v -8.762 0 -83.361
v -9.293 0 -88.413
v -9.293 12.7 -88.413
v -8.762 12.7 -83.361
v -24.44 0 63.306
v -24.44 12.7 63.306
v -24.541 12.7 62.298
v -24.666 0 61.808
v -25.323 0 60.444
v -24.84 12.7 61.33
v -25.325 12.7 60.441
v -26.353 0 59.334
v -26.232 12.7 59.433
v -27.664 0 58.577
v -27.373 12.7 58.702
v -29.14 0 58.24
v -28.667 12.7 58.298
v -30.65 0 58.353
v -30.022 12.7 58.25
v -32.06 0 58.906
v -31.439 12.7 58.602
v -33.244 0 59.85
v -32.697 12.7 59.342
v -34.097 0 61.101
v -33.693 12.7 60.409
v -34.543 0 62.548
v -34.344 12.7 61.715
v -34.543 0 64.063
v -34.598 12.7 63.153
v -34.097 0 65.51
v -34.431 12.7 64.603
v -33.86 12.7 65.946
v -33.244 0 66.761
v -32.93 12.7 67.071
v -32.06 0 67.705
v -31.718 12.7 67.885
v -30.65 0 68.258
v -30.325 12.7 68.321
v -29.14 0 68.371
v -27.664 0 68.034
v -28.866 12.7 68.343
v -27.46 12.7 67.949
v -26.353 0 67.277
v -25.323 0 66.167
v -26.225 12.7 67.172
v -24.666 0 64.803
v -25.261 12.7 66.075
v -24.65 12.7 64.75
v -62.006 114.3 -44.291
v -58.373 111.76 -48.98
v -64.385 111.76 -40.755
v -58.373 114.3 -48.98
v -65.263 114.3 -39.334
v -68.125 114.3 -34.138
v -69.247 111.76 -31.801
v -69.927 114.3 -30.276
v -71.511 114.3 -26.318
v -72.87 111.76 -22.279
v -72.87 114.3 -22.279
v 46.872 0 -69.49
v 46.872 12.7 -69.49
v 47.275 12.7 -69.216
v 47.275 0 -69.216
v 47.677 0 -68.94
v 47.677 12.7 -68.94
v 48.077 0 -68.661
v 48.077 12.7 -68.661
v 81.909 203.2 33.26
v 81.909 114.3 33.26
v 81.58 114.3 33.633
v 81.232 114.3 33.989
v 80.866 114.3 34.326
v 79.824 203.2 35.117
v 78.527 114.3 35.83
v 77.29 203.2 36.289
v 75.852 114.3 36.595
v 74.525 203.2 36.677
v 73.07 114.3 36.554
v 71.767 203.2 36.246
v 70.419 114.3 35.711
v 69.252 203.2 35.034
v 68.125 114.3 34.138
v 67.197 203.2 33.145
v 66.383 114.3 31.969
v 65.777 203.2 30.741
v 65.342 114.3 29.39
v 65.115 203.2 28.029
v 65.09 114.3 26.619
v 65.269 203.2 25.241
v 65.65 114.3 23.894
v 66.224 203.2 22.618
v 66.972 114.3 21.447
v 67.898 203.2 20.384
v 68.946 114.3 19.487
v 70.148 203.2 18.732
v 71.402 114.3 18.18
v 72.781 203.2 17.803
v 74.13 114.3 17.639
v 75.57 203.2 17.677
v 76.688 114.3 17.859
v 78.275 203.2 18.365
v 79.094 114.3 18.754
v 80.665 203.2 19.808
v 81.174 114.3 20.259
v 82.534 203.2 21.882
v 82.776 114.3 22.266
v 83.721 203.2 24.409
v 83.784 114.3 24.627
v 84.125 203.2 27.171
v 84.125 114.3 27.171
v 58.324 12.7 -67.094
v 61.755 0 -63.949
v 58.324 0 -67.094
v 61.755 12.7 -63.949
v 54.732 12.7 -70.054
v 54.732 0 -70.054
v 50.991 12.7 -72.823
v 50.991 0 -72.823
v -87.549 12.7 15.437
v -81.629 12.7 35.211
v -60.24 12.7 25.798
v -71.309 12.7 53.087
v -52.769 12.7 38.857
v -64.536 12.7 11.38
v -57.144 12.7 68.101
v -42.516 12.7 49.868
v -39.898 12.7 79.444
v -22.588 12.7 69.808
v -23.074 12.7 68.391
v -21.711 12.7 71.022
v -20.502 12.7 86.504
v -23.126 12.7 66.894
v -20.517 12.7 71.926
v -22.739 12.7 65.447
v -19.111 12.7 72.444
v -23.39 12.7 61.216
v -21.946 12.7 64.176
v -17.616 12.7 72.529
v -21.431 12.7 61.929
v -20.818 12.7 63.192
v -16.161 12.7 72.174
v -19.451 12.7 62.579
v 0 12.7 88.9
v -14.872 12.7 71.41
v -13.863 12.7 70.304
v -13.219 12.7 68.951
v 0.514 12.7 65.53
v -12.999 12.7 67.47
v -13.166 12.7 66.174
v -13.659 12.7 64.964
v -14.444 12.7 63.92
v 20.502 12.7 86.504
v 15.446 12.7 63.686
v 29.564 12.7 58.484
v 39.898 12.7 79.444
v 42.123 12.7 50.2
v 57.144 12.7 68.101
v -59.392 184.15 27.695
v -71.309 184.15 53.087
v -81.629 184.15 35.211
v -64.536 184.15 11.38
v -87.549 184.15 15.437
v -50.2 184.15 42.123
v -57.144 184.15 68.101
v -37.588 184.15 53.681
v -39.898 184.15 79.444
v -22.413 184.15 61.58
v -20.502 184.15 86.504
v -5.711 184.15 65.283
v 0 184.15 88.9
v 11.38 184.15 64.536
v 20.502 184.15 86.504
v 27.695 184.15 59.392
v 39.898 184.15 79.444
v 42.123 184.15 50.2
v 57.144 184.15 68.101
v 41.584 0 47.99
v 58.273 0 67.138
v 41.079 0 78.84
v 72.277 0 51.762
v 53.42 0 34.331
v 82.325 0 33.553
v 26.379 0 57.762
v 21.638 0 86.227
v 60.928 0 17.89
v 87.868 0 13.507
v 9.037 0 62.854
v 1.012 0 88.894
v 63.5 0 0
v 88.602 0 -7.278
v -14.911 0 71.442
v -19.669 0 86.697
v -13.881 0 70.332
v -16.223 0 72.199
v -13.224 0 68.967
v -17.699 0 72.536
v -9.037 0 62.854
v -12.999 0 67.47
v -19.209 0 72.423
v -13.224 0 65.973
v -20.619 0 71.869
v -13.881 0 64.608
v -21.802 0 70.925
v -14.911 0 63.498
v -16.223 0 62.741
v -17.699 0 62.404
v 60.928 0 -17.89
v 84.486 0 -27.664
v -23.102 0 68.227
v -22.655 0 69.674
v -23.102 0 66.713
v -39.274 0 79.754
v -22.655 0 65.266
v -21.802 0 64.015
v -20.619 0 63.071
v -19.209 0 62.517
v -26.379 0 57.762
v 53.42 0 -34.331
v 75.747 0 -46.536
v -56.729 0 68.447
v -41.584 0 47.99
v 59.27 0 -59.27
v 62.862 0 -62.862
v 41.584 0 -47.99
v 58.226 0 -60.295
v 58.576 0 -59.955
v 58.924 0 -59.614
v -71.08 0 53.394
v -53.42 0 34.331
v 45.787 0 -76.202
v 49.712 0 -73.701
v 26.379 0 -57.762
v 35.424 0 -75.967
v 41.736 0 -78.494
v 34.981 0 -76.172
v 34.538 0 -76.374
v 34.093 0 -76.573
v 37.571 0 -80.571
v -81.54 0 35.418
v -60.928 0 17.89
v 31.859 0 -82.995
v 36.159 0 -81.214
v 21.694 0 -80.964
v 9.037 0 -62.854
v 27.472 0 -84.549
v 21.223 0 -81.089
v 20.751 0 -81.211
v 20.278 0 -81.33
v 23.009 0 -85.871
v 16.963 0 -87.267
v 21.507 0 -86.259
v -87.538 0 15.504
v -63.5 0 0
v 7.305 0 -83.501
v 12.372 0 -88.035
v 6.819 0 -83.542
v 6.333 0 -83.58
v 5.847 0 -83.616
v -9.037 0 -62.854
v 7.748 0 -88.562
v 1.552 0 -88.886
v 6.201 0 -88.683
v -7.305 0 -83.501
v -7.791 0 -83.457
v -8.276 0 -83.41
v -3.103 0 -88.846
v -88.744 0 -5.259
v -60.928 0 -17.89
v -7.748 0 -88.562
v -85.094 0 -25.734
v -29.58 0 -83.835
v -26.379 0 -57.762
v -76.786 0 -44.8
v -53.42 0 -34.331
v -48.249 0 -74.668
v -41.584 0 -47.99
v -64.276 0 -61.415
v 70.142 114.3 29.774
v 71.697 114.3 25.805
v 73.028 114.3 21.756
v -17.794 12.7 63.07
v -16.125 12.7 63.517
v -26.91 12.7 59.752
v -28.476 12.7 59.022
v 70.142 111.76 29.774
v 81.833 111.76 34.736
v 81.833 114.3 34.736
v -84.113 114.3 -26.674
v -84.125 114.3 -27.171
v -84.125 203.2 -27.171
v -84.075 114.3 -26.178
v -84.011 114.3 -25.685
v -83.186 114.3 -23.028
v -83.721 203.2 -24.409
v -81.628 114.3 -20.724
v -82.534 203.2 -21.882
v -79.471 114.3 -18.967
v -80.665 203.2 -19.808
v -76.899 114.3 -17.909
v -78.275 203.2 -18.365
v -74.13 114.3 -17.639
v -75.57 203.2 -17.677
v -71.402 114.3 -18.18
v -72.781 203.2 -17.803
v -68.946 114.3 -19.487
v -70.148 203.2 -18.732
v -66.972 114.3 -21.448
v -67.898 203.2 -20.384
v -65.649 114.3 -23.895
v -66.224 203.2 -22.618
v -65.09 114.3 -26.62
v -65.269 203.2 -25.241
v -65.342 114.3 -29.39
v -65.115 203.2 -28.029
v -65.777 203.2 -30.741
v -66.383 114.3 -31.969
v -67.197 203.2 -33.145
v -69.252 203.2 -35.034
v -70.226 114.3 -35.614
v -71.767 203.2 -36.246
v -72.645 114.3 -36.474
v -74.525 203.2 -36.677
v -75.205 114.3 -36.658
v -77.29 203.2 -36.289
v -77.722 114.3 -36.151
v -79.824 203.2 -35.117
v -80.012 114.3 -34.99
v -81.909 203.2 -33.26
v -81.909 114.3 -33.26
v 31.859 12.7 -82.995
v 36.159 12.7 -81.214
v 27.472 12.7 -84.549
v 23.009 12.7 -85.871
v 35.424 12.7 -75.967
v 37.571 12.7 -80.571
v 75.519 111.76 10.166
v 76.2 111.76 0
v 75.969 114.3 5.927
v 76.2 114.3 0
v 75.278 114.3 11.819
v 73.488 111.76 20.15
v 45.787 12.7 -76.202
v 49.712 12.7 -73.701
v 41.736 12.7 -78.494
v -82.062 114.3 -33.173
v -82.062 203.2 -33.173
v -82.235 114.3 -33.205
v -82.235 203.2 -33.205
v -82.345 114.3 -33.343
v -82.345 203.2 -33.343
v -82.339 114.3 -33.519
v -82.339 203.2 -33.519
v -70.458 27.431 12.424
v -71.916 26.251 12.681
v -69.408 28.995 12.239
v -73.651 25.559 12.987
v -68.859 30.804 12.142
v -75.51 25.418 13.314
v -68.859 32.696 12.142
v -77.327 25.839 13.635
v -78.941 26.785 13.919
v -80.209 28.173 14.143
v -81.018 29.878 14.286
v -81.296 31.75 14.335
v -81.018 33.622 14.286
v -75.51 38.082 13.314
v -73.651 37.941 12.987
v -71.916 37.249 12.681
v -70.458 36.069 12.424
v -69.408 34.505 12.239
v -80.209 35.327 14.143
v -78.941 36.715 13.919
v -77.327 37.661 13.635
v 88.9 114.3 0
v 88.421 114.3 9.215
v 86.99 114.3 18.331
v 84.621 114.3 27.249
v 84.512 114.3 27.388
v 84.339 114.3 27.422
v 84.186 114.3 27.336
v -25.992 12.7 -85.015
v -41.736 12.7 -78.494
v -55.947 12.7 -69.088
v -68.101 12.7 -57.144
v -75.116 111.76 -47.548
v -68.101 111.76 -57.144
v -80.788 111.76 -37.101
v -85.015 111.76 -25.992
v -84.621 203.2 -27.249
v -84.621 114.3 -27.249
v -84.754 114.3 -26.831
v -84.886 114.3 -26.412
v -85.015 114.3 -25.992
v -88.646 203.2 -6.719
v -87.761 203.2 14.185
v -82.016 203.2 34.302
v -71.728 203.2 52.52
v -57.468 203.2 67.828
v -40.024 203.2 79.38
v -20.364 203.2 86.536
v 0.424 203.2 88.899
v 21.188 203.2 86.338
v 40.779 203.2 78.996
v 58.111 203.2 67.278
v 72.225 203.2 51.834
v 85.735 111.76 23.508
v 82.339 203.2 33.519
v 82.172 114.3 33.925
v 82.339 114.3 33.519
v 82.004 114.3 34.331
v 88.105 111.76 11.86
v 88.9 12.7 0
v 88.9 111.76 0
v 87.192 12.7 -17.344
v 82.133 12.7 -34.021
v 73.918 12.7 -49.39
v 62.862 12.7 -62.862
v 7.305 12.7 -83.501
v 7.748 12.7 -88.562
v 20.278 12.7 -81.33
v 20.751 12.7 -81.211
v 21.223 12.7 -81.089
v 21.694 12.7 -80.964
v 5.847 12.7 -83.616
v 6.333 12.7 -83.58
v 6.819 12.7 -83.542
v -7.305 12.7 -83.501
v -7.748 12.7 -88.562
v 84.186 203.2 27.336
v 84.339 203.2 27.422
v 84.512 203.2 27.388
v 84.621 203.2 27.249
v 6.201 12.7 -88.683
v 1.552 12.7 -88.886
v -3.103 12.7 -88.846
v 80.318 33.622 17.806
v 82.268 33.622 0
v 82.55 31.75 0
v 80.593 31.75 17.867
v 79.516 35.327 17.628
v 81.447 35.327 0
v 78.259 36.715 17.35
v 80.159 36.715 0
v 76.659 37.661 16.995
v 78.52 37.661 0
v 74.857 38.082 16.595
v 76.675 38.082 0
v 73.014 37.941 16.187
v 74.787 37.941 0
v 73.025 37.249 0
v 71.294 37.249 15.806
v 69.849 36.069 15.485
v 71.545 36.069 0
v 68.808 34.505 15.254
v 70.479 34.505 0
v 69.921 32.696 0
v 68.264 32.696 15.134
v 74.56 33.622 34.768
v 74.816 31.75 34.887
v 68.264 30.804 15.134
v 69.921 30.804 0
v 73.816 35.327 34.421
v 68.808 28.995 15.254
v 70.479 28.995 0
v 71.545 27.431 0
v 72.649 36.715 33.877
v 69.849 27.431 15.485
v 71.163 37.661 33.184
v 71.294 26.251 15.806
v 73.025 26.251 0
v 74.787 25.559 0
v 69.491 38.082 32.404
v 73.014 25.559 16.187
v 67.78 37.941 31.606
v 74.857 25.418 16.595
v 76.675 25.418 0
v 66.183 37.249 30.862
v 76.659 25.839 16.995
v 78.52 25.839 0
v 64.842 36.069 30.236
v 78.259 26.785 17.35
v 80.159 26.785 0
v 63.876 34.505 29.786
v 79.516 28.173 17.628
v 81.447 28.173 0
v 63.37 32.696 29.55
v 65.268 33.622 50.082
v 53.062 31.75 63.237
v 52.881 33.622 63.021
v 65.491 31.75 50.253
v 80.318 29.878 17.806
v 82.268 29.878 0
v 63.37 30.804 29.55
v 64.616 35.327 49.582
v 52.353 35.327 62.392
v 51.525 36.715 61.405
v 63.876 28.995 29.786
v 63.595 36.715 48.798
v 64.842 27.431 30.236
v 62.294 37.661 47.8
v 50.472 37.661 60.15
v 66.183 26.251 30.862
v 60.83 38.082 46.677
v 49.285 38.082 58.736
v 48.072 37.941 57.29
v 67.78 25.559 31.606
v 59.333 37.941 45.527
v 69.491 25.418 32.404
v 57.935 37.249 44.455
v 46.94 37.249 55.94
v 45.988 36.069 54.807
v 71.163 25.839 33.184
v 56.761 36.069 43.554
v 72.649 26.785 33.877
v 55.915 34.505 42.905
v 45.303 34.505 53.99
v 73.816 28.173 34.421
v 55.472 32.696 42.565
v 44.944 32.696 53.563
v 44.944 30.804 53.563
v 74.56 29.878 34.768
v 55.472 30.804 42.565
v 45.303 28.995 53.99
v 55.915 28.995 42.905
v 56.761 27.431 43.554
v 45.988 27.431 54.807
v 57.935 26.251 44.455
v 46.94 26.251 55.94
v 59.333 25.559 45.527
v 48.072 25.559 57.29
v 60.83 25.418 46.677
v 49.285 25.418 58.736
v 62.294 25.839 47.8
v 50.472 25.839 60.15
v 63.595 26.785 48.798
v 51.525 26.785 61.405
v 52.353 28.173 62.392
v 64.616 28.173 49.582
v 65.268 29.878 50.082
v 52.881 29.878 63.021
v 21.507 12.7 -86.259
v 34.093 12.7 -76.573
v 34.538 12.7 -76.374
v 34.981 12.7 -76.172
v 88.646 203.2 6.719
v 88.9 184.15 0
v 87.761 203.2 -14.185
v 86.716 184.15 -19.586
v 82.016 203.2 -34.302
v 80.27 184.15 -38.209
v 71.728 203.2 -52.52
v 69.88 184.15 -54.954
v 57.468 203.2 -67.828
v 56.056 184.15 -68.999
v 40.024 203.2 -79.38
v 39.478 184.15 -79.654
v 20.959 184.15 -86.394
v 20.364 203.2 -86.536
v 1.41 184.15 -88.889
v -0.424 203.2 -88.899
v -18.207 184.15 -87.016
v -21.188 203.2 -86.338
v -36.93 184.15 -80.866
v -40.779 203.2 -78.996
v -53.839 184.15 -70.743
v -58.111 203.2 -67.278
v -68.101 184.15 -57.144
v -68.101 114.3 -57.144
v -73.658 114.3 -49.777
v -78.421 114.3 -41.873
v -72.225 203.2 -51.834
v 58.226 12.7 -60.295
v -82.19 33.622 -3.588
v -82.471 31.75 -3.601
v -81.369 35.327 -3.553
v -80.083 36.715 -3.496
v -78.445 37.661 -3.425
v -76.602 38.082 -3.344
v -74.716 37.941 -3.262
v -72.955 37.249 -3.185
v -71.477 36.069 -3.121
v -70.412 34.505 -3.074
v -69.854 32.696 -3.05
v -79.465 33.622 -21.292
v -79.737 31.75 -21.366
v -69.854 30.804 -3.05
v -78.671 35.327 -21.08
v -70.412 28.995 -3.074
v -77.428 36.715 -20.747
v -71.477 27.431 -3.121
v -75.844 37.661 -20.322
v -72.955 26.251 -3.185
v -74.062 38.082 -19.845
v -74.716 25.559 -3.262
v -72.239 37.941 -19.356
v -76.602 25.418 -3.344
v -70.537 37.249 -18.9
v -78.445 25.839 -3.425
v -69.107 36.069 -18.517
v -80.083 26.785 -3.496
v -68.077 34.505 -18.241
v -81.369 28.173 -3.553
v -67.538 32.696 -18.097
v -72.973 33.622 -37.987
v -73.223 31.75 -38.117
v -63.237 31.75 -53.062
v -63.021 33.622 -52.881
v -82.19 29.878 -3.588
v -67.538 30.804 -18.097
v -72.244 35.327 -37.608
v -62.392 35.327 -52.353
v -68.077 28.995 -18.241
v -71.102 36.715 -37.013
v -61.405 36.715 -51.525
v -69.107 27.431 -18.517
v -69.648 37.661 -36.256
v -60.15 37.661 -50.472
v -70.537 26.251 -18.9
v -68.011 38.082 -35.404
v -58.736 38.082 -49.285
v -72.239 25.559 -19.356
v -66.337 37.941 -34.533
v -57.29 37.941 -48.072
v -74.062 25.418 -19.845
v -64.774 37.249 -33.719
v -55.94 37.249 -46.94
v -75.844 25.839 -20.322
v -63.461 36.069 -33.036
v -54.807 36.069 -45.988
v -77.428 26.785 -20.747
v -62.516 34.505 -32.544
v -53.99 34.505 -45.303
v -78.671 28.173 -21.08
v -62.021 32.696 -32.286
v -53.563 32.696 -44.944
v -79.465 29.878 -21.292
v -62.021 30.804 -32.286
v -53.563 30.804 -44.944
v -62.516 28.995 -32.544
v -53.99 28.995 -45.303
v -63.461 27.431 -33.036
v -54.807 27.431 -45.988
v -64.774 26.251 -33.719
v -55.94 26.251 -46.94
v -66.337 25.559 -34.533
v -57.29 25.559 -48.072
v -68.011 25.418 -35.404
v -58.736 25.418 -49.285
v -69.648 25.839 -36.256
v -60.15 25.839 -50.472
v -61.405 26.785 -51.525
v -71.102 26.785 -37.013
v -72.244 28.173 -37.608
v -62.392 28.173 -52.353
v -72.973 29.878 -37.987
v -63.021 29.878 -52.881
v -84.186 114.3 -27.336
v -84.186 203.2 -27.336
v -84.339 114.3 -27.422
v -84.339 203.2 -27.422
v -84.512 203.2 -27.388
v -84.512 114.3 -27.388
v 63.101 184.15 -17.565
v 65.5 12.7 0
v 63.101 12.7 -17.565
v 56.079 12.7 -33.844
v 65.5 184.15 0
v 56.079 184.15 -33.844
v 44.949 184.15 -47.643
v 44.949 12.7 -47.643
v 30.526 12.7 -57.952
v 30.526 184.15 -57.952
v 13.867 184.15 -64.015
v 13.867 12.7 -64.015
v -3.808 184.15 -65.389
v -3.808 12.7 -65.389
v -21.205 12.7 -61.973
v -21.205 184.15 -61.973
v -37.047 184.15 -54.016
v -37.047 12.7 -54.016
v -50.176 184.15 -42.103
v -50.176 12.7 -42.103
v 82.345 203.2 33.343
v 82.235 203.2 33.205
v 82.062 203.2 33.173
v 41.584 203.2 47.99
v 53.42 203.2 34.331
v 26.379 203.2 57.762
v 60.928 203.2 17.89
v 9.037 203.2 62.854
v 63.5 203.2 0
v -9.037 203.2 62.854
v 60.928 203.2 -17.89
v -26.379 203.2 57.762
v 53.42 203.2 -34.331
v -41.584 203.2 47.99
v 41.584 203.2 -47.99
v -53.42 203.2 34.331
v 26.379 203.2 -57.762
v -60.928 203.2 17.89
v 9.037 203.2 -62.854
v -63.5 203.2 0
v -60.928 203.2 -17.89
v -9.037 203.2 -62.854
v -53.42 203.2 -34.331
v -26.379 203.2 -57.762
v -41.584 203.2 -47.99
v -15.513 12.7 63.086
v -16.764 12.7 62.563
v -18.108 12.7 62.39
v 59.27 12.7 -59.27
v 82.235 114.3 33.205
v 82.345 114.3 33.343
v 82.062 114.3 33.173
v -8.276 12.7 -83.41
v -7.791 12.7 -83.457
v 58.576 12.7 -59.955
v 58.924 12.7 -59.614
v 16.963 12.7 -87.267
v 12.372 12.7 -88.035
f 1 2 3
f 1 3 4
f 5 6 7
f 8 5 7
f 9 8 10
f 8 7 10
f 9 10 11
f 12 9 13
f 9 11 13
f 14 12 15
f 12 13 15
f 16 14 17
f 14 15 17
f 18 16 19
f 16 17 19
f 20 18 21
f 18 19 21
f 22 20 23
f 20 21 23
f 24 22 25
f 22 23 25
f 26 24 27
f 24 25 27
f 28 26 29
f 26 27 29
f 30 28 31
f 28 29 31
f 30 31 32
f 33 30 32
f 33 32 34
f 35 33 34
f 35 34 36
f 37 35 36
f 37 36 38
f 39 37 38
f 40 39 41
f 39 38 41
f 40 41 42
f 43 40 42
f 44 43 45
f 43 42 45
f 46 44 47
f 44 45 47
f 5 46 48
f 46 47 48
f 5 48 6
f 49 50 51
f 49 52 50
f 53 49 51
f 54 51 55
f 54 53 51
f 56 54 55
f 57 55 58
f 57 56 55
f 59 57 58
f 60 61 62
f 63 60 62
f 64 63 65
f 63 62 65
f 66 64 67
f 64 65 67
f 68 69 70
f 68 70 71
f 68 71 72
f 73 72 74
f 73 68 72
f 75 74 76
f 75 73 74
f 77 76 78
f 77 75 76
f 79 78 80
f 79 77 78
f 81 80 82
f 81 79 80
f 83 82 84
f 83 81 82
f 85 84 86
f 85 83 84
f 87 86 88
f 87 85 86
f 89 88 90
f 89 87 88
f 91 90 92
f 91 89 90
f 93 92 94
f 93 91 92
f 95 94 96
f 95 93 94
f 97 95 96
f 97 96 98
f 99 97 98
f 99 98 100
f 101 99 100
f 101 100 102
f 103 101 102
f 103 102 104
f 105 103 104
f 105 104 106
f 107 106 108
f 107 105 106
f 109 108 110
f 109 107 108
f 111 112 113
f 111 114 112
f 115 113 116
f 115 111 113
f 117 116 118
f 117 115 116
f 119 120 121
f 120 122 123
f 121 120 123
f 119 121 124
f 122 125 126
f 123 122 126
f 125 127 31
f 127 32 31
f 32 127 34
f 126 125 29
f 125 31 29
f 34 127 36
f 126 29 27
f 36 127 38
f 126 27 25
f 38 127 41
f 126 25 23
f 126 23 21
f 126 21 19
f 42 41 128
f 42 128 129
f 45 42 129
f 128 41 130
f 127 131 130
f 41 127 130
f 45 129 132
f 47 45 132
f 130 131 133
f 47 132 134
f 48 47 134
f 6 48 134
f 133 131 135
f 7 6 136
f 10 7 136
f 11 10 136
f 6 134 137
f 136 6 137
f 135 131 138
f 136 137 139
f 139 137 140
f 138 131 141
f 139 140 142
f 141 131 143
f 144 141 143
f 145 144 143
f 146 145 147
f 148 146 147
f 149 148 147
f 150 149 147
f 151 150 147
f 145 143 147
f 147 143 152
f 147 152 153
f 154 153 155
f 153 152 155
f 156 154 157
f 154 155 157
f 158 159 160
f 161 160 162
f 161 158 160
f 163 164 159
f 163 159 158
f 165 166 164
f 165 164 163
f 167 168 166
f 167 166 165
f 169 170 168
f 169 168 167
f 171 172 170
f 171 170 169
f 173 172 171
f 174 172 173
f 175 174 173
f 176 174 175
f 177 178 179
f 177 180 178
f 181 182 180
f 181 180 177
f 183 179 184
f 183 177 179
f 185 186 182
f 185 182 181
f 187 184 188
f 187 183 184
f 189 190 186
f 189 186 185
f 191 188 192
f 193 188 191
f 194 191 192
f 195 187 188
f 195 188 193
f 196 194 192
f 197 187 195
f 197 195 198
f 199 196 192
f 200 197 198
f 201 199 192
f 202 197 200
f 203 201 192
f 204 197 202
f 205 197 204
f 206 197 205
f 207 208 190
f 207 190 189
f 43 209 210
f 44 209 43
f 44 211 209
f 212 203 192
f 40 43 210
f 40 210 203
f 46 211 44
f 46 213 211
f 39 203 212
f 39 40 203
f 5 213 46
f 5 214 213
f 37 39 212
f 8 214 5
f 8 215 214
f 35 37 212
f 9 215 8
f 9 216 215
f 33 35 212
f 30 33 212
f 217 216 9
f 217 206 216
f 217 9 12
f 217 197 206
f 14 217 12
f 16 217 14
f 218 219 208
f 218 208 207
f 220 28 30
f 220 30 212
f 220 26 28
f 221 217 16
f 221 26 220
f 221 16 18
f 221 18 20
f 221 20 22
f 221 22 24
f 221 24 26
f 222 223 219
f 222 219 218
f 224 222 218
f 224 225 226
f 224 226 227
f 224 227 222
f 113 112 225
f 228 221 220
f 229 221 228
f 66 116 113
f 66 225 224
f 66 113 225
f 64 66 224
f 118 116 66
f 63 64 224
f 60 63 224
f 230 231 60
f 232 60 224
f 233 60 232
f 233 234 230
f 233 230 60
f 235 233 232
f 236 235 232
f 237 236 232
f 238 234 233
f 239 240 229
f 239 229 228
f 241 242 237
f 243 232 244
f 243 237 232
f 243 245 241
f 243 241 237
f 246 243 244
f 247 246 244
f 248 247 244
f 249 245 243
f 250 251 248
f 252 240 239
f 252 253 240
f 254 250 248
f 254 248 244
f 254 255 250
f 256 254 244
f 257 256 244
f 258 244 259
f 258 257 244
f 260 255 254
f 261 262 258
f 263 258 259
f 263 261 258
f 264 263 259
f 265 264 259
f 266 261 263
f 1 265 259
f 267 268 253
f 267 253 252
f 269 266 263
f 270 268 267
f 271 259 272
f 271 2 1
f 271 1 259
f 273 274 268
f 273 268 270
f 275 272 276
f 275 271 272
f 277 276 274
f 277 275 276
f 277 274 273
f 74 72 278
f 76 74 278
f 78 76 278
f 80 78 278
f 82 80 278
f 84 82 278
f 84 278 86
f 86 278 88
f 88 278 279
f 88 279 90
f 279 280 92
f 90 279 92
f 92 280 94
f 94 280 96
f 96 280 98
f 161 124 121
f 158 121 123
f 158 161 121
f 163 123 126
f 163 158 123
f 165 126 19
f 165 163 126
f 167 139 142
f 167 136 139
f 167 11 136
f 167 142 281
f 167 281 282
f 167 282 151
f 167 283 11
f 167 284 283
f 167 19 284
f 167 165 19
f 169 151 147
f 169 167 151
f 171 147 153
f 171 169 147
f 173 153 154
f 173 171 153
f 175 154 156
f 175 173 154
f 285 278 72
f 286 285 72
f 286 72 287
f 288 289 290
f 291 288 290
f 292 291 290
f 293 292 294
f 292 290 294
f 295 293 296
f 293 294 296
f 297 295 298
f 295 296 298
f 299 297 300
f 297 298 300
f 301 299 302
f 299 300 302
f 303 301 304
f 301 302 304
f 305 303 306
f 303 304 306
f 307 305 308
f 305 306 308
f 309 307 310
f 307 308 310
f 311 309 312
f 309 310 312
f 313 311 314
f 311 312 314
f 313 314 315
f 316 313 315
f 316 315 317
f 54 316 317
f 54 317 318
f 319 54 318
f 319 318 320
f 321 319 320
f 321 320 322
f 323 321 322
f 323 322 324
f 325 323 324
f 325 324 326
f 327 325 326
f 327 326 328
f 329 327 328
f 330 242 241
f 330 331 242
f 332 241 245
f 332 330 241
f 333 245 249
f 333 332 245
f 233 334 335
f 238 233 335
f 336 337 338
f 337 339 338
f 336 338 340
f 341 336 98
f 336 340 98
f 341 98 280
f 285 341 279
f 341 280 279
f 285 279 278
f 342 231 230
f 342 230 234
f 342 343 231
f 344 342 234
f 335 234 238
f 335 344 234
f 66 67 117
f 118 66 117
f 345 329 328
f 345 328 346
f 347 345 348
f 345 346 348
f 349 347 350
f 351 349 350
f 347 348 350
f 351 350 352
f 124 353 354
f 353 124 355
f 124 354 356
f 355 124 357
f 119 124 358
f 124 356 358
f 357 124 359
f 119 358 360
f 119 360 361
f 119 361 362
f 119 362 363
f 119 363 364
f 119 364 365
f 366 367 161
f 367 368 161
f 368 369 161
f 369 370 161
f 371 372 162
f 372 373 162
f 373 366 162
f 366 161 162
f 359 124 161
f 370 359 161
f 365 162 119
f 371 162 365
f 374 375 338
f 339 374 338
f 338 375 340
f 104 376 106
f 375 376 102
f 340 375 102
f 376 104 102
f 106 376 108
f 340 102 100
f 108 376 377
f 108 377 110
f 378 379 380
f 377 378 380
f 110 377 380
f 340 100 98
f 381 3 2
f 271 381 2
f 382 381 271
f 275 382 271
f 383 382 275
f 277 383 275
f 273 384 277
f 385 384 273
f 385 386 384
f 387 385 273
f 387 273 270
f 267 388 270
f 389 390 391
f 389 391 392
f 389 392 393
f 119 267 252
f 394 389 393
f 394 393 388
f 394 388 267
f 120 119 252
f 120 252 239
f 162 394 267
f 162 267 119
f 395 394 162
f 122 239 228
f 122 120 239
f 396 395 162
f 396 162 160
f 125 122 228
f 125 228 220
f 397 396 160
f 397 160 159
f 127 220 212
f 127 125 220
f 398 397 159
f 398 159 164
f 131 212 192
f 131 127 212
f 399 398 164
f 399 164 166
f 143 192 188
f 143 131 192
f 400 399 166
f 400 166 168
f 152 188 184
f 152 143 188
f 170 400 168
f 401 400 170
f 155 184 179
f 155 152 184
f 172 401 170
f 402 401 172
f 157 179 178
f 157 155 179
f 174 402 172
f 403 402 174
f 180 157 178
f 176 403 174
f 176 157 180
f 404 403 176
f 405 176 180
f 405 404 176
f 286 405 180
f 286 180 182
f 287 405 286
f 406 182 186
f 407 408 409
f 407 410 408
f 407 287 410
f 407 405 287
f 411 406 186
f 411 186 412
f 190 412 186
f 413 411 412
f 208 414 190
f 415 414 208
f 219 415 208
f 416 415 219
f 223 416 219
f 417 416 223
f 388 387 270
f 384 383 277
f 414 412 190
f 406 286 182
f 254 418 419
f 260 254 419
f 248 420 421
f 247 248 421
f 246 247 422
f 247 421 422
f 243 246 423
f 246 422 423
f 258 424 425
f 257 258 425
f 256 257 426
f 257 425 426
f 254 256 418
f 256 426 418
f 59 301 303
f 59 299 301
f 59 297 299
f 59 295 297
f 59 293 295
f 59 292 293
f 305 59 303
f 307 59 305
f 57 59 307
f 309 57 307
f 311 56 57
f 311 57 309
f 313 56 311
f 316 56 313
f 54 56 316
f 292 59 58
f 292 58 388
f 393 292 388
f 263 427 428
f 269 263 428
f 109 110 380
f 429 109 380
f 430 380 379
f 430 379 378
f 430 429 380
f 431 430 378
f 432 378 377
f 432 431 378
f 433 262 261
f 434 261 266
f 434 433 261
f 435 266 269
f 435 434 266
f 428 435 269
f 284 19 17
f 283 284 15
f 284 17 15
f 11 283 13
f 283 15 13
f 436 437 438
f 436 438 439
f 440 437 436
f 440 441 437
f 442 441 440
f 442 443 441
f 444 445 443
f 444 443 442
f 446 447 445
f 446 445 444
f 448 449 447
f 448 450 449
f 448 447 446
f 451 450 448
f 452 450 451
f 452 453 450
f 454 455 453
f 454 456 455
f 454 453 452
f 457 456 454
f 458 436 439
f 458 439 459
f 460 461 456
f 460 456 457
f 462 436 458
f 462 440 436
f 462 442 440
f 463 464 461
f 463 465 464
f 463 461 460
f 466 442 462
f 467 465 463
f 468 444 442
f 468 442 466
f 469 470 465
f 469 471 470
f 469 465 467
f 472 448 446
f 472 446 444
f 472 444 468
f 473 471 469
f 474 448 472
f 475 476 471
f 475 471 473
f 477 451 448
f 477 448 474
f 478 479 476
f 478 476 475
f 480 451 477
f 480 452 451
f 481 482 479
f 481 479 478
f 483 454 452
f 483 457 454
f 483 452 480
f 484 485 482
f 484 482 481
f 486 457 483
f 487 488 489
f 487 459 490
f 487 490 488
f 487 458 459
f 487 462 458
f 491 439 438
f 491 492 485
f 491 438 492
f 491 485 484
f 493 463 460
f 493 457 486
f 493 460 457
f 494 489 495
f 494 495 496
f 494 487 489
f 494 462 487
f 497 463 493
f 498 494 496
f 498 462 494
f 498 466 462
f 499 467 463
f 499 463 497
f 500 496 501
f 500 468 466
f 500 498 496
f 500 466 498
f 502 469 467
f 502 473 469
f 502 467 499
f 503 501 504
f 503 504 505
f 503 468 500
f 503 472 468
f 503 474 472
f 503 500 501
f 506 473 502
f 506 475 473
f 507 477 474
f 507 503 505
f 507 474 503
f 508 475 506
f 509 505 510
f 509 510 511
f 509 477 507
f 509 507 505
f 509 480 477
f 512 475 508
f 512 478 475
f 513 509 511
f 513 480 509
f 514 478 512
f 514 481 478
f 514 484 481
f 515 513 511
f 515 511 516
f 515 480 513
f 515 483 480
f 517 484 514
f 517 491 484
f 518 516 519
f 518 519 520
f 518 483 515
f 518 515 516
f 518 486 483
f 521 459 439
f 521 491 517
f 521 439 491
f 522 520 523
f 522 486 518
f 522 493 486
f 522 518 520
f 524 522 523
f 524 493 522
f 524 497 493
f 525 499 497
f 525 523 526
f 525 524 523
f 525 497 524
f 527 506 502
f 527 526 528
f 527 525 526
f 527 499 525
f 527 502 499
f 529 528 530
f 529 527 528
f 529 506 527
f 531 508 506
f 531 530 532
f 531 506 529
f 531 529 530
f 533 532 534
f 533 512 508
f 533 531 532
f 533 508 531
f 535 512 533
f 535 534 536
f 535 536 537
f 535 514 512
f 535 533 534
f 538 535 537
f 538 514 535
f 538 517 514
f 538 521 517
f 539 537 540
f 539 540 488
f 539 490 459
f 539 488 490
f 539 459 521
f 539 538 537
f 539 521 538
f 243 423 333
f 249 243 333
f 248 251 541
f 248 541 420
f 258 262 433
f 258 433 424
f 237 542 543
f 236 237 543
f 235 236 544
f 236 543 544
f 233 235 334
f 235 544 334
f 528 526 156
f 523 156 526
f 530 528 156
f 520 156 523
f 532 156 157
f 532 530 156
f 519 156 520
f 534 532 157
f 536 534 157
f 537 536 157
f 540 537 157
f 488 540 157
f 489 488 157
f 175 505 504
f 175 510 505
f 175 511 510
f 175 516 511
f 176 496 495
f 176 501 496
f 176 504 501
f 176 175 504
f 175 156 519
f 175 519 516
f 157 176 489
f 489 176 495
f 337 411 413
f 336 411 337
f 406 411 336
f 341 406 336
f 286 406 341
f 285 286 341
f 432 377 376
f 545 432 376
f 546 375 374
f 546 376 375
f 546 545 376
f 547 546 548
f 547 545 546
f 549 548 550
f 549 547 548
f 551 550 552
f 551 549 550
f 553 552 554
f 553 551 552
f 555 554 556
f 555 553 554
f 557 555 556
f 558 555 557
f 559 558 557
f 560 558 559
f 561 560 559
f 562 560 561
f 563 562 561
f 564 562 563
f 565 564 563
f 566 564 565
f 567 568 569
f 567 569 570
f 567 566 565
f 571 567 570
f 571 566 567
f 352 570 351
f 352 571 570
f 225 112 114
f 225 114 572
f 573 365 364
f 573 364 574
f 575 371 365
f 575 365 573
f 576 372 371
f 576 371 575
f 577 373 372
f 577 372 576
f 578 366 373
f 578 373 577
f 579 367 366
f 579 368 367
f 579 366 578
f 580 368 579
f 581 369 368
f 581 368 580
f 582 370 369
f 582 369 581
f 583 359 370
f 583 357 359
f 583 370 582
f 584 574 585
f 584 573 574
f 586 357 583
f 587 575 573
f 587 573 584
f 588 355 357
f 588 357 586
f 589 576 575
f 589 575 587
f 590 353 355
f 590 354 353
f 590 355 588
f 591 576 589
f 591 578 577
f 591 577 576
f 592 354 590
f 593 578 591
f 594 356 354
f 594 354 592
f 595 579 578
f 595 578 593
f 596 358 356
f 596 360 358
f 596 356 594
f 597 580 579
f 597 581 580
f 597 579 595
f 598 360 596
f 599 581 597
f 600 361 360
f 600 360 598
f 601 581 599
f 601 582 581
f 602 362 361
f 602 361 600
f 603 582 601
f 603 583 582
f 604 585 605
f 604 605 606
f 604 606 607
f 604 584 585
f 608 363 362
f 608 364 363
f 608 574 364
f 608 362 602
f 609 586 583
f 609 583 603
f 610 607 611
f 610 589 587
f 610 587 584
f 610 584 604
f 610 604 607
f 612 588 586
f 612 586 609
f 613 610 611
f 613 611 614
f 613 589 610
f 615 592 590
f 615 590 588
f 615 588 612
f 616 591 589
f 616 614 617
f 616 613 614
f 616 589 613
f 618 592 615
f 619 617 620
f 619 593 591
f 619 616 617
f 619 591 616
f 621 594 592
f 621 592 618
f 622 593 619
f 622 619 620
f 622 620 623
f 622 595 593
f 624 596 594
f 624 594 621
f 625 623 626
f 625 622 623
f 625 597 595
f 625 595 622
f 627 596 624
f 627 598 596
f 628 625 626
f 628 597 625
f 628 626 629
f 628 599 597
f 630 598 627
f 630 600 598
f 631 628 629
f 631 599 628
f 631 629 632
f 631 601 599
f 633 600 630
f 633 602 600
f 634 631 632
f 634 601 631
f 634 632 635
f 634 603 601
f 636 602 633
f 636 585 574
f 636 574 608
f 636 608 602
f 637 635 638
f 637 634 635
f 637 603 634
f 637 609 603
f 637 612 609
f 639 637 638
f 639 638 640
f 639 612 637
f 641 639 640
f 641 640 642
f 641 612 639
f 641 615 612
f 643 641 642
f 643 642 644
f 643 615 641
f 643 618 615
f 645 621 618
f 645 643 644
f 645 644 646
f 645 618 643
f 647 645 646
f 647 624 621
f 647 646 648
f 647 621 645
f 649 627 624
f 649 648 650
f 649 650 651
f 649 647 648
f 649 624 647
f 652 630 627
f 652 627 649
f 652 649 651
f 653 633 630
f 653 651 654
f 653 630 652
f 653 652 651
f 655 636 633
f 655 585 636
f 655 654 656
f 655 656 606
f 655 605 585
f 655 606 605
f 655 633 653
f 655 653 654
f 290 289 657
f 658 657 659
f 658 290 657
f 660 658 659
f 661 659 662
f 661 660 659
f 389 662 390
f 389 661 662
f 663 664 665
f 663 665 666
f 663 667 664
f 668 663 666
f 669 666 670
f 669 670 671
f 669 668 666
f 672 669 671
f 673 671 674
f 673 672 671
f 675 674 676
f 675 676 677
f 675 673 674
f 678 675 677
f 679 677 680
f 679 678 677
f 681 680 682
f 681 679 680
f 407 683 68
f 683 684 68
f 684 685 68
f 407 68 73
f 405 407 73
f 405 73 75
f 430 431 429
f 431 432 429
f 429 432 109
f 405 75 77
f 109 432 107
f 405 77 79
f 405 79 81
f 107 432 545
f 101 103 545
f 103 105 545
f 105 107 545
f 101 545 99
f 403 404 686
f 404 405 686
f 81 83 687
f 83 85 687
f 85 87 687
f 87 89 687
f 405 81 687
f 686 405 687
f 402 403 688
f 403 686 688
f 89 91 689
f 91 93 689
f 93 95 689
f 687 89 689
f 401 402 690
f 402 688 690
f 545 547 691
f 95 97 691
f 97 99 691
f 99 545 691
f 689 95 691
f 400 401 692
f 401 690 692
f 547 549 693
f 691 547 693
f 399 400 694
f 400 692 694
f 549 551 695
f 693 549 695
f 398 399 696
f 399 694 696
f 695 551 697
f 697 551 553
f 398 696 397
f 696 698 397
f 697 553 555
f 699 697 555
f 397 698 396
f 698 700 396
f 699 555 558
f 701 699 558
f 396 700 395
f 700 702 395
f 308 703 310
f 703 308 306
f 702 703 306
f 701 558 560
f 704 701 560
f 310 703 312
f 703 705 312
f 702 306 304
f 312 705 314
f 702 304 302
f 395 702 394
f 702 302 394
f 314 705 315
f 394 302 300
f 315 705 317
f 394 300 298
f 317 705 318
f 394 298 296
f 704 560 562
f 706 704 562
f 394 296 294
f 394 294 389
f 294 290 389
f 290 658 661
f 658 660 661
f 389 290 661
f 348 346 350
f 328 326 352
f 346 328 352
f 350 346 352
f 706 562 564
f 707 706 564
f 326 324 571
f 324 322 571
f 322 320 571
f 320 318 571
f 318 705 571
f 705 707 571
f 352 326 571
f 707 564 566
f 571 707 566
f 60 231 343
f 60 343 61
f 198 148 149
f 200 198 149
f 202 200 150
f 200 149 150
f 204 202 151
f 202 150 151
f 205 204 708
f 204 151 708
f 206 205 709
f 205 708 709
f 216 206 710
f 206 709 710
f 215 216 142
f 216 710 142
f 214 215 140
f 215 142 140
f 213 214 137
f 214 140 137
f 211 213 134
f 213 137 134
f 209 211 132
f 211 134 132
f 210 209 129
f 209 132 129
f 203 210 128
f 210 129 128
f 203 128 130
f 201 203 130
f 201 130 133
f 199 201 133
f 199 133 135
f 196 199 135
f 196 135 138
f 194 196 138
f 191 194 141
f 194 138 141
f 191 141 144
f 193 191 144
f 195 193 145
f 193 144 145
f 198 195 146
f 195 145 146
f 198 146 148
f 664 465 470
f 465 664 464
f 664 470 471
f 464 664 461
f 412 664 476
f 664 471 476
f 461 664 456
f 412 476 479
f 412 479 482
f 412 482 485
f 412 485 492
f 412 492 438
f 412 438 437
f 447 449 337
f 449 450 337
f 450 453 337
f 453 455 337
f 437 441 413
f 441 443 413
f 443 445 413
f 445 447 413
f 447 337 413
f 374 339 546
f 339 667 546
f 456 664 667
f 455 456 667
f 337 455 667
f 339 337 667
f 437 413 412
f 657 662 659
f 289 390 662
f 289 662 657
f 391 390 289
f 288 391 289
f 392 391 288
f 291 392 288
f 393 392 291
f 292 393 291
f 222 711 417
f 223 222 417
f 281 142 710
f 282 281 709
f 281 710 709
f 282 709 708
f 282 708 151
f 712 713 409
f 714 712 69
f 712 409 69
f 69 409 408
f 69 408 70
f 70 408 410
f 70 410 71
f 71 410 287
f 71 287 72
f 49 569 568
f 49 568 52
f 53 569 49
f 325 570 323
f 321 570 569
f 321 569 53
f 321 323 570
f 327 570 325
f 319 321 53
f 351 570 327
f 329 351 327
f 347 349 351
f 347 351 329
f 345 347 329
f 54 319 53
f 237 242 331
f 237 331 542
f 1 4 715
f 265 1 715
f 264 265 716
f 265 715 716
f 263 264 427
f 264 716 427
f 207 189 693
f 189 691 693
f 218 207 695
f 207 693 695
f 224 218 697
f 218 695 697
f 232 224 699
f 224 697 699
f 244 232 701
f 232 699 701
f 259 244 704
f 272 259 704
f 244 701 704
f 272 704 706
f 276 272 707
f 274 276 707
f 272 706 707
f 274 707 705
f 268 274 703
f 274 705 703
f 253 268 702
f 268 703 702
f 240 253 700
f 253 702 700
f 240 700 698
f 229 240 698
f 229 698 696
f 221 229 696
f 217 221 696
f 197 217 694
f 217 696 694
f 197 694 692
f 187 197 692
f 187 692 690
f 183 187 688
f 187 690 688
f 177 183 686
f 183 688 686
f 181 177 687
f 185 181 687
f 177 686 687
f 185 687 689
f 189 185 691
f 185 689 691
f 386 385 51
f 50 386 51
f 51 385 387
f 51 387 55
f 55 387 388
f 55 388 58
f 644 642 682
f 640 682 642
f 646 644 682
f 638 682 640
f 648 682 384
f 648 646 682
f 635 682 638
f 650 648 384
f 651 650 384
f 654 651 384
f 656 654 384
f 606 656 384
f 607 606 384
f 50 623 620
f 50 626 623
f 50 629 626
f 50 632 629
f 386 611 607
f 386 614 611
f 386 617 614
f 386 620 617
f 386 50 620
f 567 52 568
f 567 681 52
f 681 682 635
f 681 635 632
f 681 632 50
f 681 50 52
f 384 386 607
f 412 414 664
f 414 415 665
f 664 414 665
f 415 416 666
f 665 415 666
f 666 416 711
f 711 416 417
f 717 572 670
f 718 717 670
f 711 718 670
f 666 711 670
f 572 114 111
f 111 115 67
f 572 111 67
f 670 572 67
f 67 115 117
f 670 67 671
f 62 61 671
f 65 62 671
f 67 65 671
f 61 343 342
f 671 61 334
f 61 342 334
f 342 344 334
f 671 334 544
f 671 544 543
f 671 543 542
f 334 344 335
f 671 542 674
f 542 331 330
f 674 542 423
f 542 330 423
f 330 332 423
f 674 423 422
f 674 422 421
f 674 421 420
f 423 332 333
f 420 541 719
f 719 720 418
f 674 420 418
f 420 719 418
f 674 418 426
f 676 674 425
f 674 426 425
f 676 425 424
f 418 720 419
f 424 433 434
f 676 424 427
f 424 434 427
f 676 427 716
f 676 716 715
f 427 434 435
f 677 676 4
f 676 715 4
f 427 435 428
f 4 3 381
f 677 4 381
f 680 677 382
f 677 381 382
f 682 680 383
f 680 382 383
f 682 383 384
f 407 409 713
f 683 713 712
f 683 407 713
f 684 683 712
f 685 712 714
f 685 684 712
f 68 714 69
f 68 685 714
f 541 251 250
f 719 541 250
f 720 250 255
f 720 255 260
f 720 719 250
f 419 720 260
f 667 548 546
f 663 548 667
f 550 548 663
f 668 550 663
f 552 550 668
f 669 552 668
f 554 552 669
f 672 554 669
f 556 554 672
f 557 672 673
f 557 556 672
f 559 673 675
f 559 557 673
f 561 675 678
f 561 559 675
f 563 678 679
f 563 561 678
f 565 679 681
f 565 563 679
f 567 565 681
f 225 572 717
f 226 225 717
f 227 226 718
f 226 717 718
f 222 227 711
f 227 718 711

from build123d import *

# Parameters (mm, degrees)
SKETCH1_W                    = 25.4
SKETCH1_H                    = 203.2
SKETCH2_W                    = 23.400004
SKETCH2_H                    = 171.45
CUT_REVOLVE1_ANGLE           = 140
SKETCH5_R                    = 9.525
CUT_EXTRUDE1_DEPTH           = 88.9
SKETCH7_W                    = 12.7
SKETCH7_H                    = 2.54
CUT_REVOLVE3_ANGLE           = 23
FILLET2_R                    = 0.254
FILLET2_OF_MIRROR1_R         = 0.254
CUT_EXTRUDE6_DEPTH           = 12.7
CIRPATTERN1_COUNT            = 6
CIRPATTERN1_ANGLE            = 50
SKETCH12_R                   = 5.08
CUT_EXTRUDE7_DEPTH           = 12.7
SKETCH16_W                   = 23.368
SKETCH16_H                   = 171.45
CUT_REVOLVE4_ANGLE           = 60
CUT_REVOLVE4_OTHER_WAY_ANGLE = 60
SKETCH17_R                   = 6.35


with BuildPart() as part:
    # Sketch1 → Revolve1 (revolve)
    with BuildSketch(Plane.XY):
        with Locations((76.2, 101.6)):
            Rectangle(SKETCH1_W, SKETCH1_H)
    revolve(axis=Axis((0, 0, 0), (0, 1, 0)))

    # Sketch2 → Cut-Revolve1 (revolve, cut)
    with BuildSketch(Plane.XY):
        with Locations((77.199998, 98.425)):
            Rectangle(SKETCH2_W, SKETCH2_H)
    revolve(axis=Axis((0, 0, 0), (0, 1, 0)), revolution_arc=CUT_REVOLVE1_ANGLE, mode=Mode.SUBTRACT)

    # Sketch5 → Cut-Extrude1 (cut)
    with BuildSketch(Plane(origin=(0, 203.2, 0), x_dir=(1, 0, 0), z_dir=(0, 1, 0))):
        with Locations((-74.600035871, 27.152192532)):
            Circle(SKETCH5_R)
    cut_extrude1 = extrude(amount=-CUT_EXTRUDE1_DEPTH, mode=Mode.SUBTRACT)

    # Sketch7 → Cut-Revolve3 (revolve, cut)
    with BuildSketch(Plane(origin=(0, 0, 0), x_dir=(-0.766044443, 0, -0.64278761), z_dir=(0.64278761, 0, -0.766044443))):
        with Locations((82.55, 113.03)):
            Rectangle(SKETCH7_W, SKETCH7_H)
    cut_revolve3 = revolve(axis=Axis((0, 213.36, 0), (0, 1, 0)), revolution_arc=CUT_REVOLVE3_ANGLE, mode=Mode.SUBTRACT)

    # Fillet2
    fillet2_edges = [part.edges().sort_by_distance(p)[0] for p in [
        (-83.359280525, 158.75, -30.894018036),
        (-83.715205635, 158.75, -29.916121832),
    ]]
    fillet(fillet2_edges, radius=FILLET2_R)

    # Mirror1: Cut-Extrude1, Cut-Revolve3 across plane
    add(cut_extrude1.mirror(Plane(origin=(0, 0, 0), x_dir=(-0.342020143, 0, 0.939692621), z_dir=(-0.939692621, 0, -0.342020143))), mode=Mode.SUBTRACT)
    add(cut_revolve3.mirror(Plane(origin=(0, 0, 0), x_dir=(-0.342020143, 0, 0.939692621), z_dir=(-0.939692621, 0, -0.342020143))), mode=Mode.SUBTRACT)

    # Fillet2 of Mirror1
    fillet2_of_mirror1_edges = [part.edges().sort_by_distance(p)[0] for p in [
        (83.715205635, 158.75, 29.916121832),
        (83.359280525, 158.75, 30.894018036),
    ]]
    fillet(fillet2_of_mirror1_edges, radius=FILLET2_OF_MIRROR1_R)

    # Sketch15 → Cut-Extrude6 (cut)
    with BuildSketch(Plane(origin=(0, 12.7, 0), x_dir=(1, 0, 0), z_dir=(0, 1, 0))):
        with BuildLine():
            Line((59.269690399, 59.269690399), (62.861792847, 62.861792847))
            ThreePointArc((62.861792847, 62.861792847), (62.310833596, 63.40796493), (61.755129134, 63.94930825))
            Line((61.755129134, 63.94930825), (58.226264612, 60.295062064))
            ThreePointArc((58.226264612, 60.295062064), (58.750214534, 59.784652648), (59.269690399, 59.269690399))
        make_face()
    cut_extrude6 = extrude(amount=-CUT_EXTRUDE6_DEPTH, mode=Mode.SUBTRACT)

    # CirPattern1: Cut-Extrude6 ×6 about axis
    cirpattern1_axis = Axis((0, 0, 0), (0, 1, 0))
    for i in range(1, CIRPATTERN1_COUNT):
        add(cut_extrude6.rotate(cirpattern1_axis, i * CIRPATTERN1_ANGLE / (CIRPATTERN1_COUNT - 1)), mode=Mode.SUBTRACT)

    # Sketch12 → Cut-Extrude7 (cut)
    with BuildSketch(Plane(origin=(0, 12.7, 0), x_dir=(1, 0, 0), z_dir=(0, 1, 0))):
        with Locations((-29.519885583, -63.305598925)):
            Circle(SKETCH12_R)
        with Locations((-18.0785103, -67.469918966)):
            Circle(SKETCH12_R)
    extrude(amount=-CUT_EXTRUDE7_DEPTH, mode=Mode.SUBTRACT)

    # Sketch16 → Cut-Revolve4 (revolve, cut)
    with BuildSketch(Plane(origin=(0, 0, 0), x_dir=(-0.342020143, 0, 0.939692621), z_dir=(-0.939692621, 0, -0.342020143))):
        with Locations((77.216, 98.425)):
            Rectangle(SKETCH16_W, SKETCH16_H)
    revolve(axis=Axis((0, -7.62, 0), (0, 1, 0)), revolution_arc=CUT_REVOLVE4_ANGLE, mode=Mode.SUBTRACT)

    # Sketch16 → Cut-Revolve4 other way (revolve, cut)
    with BuildSketch(Plane(origin=(0, 0, 0), x_dir=(-0.342020143, 0, 0.939692621), z_dir=(-0.939692621, 0, -0.342020143))):
        with Locations((77.216, 98.425)):
            Rectangle(SKETCH16_W, SKETCH16_H)
    revolve(axis=Axis((0, -7.62, 0), (0, -1, 0)), revolution_arc=CUT_REVOLVE4_OTHER_WAY_ANGLE, mode=Mode.SUBTRACT)

    # Sketch17 → Cut-Revolve5 (revolve, cut)
    with BuildSketch(Plane(origin=(0, 0, 0), x_dir=(-0.342020143, 0, 0.939692621), z_dir=(-0.939692621, 0, -0.342020143))):
        with Locations((76.2, 31.75)):
            Circle(SKETCH17_R)
    revolve(axis=Axis((0, 213.36, 0), (0, -1, 0)), mode=Mode.SUBTRACT)


solid = part.part
